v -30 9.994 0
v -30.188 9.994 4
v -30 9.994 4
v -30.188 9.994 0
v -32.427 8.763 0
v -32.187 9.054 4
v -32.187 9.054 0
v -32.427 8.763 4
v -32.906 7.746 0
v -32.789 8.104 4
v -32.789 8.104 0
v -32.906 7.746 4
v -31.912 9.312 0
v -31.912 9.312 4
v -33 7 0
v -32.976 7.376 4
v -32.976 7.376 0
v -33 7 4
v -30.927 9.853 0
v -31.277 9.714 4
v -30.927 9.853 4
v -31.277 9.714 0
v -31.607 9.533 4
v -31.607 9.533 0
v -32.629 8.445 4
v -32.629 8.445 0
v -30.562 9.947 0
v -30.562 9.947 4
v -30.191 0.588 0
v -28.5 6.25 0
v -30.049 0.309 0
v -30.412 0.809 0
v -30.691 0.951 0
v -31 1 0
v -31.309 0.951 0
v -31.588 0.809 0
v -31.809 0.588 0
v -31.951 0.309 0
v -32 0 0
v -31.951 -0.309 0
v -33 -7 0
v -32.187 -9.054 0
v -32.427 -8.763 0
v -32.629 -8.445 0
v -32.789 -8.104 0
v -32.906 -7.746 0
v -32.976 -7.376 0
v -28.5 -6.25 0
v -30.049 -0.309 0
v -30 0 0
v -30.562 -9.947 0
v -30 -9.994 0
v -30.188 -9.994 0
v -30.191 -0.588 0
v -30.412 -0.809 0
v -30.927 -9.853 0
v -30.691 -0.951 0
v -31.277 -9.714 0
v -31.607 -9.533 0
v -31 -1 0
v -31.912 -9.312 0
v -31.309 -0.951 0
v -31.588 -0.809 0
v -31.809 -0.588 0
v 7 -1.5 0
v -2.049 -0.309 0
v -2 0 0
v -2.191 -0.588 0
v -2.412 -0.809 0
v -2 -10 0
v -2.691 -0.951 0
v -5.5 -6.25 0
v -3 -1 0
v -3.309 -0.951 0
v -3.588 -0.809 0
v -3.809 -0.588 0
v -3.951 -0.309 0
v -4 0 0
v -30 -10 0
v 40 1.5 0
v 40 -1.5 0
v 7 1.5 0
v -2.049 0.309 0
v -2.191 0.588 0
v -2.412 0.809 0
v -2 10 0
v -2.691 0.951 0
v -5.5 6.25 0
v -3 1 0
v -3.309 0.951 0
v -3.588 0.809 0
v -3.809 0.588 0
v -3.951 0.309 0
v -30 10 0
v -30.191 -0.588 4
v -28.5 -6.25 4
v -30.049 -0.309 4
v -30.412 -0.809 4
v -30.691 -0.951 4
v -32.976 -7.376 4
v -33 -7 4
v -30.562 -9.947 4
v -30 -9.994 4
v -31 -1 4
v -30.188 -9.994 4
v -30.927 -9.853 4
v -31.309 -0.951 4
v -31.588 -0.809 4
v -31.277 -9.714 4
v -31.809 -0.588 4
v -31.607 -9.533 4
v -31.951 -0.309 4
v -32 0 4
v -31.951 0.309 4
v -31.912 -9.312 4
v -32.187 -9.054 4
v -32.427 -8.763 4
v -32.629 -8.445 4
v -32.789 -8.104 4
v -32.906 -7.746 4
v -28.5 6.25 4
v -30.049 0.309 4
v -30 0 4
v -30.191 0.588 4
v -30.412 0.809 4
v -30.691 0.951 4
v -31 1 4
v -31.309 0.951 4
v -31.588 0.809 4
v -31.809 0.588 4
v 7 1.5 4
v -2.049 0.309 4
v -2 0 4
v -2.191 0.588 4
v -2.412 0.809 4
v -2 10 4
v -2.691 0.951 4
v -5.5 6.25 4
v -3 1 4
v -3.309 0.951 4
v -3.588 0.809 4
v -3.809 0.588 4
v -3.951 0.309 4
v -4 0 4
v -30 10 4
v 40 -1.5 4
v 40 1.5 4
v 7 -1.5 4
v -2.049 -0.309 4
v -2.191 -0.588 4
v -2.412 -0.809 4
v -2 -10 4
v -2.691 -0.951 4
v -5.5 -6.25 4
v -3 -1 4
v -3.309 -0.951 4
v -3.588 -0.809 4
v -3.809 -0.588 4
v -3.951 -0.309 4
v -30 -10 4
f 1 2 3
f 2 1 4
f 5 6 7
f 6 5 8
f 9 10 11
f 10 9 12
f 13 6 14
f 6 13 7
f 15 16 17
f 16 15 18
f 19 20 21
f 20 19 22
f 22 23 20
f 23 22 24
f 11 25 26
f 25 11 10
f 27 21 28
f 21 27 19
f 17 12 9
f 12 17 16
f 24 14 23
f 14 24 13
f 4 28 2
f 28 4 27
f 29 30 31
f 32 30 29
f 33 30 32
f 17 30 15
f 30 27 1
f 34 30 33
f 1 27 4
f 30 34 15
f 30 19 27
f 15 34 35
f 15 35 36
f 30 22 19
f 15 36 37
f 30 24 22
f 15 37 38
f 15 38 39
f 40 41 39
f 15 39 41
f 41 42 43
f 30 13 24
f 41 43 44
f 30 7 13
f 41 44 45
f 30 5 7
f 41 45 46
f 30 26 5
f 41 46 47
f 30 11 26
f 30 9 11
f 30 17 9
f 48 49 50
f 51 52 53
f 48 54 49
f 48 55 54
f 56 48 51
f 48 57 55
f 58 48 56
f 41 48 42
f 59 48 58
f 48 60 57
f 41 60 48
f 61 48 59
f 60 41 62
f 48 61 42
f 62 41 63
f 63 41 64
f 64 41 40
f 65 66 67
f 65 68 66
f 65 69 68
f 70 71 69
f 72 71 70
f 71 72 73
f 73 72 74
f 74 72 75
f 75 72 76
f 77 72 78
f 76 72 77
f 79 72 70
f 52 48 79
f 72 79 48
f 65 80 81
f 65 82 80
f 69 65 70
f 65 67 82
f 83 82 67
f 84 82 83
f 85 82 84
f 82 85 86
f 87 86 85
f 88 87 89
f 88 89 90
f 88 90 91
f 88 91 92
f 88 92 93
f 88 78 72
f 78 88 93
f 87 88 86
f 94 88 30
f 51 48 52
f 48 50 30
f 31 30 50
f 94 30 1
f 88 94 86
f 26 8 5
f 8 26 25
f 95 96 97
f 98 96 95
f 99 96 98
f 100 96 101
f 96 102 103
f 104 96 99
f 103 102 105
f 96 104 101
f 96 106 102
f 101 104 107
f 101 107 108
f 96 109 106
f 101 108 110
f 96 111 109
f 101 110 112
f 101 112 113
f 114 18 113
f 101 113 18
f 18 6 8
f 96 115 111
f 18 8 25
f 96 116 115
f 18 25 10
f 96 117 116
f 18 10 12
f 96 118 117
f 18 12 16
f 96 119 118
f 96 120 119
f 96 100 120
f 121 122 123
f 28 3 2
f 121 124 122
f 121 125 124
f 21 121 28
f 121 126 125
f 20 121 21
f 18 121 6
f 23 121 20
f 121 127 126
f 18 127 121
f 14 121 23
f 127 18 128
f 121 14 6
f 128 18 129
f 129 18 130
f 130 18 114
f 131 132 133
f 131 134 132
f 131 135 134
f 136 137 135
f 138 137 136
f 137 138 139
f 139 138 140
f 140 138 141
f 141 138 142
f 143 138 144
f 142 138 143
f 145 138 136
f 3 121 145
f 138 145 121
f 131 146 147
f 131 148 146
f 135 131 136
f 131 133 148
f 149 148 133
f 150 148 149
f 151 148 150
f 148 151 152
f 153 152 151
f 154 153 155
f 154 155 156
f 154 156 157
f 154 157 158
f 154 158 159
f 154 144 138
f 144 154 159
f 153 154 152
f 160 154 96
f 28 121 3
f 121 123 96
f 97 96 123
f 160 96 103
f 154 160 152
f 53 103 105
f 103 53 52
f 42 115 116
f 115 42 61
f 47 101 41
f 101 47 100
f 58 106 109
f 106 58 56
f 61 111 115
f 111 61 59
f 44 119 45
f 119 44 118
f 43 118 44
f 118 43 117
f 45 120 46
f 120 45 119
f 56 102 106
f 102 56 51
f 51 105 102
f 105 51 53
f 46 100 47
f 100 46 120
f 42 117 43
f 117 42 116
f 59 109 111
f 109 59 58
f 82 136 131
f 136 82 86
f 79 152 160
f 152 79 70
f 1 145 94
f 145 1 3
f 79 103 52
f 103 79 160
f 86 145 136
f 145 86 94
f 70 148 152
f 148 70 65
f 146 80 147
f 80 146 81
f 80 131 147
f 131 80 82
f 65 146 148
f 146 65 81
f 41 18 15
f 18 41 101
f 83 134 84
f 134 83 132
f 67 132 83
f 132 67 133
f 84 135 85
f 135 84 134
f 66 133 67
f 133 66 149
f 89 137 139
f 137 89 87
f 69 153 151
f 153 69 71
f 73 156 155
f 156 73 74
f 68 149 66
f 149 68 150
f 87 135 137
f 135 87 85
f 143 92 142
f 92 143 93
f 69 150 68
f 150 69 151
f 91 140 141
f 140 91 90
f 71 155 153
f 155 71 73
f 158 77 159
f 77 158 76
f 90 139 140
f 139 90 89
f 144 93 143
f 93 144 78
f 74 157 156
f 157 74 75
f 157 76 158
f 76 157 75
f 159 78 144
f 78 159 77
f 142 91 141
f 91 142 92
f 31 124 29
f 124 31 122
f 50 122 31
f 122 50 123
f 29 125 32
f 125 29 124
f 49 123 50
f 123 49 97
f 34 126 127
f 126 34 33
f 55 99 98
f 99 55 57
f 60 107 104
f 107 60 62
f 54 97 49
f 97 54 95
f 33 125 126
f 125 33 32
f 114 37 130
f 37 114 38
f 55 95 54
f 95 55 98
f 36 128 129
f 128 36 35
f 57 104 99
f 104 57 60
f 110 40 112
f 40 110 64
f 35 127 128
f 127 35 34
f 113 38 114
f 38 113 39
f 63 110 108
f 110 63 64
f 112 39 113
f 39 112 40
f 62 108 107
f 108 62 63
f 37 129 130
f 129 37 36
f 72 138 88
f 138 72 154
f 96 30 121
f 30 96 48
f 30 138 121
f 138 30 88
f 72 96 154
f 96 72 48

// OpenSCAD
leg(23,12.5);

module leg(shoulder_length,shoulder_width){
	difference(){
		//solid parts
		union(){
			hull(){
				//main inner square
				translate([-30,-10,0]) cube([28,20,4]);
				//lower taper
				translate([5,-1.5,0]) cube([2,3,4]);
			}
	
			//leg
			translate([0,-1.5,0]) cube([40,3,4]);
			//top bar
			translate([-33,-7,0]) cube([6,14,4]);
			//rounded corners
			for (i = [ [-30,7,0],[-30,-7,0] ]){
				translate(i) cylinder(r=3,h=4,$fn=50);
			}	
		}
		//servo mounts
		for (i = [ [-3,0,-2],[-31,0,-2] ]){
			translate(i) cylinder(r=1,h=20,$fn=20);
		}
		//hole for servo body
		translate([-17,0,2])  cube([shoulder_length,shoulder_width,22], center=true);
	}
}
